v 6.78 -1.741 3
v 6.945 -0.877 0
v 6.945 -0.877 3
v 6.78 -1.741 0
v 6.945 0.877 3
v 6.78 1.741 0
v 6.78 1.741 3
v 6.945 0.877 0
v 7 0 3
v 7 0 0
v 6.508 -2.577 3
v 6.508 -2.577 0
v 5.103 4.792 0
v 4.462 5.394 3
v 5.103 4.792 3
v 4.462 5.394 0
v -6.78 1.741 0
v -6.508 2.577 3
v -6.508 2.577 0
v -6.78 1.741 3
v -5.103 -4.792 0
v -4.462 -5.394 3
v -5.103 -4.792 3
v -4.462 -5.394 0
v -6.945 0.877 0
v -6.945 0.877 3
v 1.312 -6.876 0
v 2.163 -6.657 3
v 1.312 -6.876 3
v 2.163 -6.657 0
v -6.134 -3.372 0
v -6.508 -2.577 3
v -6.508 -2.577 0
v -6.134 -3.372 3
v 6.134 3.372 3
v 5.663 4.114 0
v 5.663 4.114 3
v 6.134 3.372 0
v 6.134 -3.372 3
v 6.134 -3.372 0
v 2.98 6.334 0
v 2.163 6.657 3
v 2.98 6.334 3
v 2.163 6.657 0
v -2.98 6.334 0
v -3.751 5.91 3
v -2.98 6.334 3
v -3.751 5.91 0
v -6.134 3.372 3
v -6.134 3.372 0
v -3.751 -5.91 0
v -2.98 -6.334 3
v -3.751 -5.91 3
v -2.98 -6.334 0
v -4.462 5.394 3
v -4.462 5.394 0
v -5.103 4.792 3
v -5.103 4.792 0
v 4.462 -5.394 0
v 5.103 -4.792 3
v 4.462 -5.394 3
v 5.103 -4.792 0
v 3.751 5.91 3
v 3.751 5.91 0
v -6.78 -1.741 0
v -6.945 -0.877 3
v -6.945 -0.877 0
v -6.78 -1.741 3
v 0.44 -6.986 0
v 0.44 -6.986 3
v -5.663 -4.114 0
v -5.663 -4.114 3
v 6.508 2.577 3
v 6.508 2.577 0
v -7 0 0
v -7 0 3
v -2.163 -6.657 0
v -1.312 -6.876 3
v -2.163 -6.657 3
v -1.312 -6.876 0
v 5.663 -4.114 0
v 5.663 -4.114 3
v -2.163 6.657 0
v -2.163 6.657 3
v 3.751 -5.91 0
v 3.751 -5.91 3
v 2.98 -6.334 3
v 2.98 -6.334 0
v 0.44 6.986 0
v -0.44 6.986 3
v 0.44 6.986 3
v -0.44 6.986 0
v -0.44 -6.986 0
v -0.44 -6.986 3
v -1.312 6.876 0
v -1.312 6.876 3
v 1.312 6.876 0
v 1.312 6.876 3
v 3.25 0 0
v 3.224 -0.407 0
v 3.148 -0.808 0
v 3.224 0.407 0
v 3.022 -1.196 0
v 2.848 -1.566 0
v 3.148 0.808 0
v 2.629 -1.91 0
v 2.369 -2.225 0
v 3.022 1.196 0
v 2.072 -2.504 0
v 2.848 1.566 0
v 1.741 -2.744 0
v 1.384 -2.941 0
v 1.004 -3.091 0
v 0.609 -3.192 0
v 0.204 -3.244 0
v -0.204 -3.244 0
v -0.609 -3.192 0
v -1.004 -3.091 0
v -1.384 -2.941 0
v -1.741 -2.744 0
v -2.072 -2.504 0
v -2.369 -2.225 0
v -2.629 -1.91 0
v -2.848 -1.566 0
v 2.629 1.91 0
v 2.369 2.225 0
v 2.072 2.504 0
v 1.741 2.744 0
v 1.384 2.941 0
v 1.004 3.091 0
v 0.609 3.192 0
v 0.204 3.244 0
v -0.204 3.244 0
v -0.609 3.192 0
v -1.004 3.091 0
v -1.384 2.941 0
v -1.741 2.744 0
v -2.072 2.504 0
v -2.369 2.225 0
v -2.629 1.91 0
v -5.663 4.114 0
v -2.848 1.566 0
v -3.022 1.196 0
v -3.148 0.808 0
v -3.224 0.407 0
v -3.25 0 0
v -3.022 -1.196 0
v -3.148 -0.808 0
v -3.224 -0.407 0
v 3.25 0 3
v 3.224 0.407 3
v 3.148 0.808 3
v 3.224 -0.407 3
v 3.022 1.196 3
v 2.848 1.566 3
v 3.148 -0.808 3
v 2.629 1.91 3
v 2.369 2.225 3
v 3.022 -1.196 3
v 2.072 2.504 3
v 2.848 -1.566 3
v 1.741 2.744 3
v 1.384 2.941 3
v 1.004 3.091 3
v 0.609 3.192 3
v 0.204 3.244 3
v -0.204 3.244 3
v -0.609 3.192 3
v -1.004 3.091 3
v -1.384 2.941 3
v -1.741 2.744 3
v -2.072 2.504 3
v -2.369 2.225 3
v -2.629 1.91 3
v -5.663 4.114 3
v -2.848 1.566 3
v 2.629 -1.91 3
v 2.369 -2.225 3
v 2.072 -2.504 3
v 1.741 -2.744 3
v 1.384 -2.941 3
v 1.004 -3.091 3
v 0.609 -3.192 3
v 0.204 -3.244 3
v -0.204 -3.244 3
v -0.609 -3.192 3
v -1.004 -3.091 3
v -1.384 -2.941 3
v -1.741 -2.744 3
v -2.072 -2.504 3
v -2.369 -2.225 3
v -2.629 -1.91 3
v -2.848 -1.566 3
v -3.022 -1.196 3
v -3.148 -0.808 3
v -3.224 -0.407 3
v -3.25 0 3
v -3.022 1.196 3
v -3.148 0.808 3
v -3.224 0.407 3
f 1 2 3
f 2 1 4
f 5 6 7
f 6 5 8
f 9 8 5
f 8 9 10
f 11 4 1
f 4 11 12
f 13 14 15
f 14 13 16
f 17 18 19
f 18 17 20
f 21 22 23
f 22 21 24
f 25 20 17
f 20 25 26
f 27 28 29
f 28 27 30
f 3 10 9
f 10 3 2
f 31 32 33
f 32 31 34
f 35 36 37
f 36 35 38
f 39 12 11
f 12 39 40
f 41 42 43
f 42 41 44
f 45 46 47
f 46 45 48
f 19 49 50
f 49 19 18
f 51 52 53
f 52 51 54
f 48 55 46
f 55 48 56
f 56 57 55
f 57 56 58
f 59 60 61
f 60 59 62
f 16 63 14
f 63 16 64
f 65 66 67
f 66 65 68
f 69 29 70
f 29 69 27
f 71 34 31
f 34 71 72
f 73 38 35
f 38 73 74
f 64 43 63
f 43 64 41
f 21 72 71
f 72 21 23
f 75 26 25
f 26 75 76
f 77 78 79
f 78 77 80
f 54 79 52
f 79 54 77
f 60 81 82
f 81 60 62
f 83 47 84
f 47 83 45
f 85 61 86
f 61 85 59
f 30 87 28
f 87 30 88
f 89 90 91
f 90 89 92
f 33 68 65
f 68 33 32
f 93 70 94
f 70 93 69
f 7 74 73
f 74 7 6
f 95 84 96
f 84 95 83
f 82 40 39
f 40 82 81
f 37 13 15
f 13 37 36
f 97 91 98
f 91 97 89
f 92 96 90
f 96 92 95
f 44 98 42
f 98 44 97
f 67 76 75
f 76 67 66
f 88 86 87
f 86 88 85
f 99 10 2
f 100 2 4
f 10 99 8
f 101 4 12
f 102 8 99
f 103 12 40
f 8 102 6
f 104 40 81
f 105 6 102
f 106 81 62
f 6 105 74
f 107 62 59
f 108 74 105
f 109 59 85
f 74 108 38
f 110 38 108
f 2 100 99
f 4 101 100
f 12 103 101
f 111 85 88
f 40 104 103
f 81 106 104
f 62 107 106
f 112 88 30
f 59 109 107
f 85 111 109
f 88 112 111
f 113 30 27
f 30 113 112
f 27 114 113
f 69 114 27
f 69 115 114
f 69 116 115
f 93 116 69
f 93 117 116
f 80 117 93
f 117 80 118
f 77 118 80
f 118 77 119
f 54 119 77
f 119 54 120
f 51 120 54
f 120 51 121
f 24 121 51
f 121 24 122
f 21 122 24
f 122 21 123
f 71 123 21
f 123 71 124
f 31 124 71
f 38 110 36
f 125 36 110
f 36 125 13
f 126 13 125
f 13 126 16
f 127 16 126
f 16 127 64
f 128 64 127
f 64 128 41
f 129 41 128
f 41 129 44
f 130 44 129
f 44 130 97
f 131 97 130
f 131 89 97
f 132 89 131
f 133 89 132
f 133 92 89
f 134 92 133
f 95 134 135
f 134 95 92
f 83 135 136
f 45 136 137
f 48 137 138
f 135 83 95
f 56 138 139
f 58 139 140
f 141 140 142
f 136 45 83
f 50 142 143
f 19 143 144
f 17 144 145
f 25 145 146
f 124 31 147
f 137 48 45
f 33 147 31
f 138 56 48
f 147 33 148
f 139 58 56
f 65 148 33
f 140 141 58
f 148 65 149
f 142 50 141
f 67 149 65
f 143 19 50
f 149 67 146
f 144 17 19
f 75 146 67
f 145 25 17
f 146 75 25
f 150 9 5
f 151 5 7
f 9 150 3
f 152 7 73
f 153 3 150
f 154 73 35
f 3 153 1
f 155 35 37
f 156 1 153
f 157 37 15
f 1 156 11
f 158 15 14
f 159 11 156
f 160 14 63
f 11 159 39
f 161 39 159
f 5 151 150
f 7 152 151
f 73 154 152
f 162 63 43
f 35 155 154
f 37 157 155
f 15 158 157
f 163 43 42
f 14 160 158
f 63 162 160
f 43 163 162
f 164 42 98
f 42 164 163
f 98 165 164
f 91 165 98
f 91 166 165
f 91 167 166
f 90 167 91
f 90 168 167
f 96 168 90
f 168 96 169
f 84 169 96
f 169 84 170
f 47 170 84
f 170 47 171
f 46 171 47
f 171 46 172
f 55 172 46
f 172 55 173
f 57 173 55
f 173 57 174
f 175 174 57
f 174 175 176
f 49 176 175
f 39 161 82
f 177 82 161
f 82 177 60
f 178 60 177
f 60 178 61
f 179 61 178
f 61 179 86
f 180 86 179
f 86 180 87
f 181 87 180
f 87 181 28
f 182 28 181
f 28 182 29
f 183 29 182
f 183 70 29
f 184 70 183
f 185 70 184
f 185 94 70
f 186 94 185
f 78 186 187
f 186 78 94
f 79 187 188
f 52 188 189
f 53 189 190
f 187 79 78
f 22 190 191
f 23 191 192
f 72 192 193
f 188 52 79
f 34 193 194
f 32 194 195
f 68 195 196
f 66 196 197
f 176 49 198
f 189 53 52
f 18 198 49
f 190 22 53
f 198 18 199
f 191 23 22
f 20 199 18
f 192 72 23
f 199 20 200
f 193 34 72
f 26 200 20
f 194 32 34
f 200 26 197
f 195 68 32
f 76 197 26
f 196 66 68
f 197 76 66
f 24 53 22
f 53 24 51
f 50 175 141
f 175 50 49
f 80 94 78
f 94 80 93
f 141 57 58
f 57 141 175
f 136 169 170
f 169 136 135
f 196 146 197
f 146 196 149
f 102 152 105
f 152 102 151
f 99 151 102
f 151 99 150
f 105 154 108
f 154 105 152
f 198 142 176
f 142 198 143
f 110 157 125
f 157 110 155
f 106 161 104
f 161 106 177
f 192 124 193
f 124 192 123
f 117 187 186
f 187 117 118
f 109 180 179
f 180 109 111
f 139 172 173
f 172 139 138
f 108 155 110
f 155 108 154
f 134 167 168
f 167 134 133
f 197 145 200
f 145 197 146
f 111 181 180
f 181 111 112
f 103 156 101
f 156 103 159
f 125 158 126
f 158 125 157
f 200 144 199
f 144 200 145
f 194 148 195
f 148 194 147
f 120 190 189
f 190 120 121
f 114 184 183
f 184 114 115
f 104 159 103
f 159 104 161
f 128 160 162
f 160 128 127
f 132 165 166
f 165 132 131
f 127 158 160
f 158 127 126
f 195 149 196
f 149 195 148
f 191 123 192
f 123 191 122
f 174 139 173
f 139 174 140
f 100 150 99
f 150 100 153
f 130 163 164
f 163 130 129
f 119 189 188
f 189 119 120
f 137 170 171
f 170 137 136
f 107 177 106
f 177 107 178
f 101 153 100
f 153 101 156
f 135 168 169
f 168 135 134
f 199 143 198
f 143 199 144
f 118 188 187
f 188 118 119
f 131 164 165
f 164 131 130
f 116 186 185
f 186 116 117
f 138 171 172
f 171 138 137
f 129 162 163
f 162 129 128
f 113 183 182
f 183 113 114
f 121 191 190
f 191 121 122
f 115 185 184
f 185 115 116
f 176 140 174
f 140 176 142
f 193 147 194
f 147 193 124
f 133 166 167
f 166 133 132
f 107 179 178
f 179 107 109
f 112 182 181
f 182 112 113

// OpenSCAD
$fn = 50;


difference() {
	union() {
		cylinder(h = 3, r = 7.0000000000);
	}
	union() {
		translate(v = [0.0000000000, 0.0000000000, -100.0000000000]) {
			cylinder(h = 200, r = 3.2500000000);
		}
	}
}
